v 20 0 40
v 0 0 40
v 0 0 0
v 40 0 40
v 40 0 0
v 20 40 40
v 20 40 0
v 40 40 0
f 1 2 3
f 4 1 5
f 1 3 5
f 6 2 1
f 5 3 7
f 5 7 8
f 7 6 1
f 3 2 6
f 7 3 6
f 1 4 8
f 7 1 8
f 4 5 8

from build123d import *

# Parameters (mm, degrees)
SKETCH1_W           = 40
SKETCH1_H           = 40
BOSS_EXTRUDE1_DEPTH = 40
CUT_EXTRUDE1_DEPTH  = 40
CUT_EXTRUDE3_DEPTH  = 20


with BuildPart() as part:
    # Sketch1 → Boss-Extrude1 (new body)
    with BuildSketch(Plane.XY):
        with Locations((20, 20)):
            Rectangle(SKETCH1_W, SKETCH1_H)
    extrude(amount=BOSS_EXTRUDE1_DEPTH)

    # Sketch2 → Cut-Extrude1 (cut)
    with BuildSketch(Plane.XY.offset(40)):
        Polygon((0, 0), (20, 40), (0, 40), align=None)
    extrude(amount=-CUT_EXTRUDE1_DEPTH, mode=Mode.SUBTRACT)

    # Sketch3 → Cut-Extrude3 (cut)
    with BuildSketch(Plane(origin=(40, 0, 0), x_dir=(0, 0, -1), z_dir=(1, 0, 0))):
        Polygon((0, 40), (-40, 40), (-20, 20), align=None)
        Polygon((-20, 20), (-40, 40), (-40, 0), align=None)
    extrude(amount=-CUT_EXTRUDE3_DEPTH, mode=Mode.SUBTRACT)


solid = part.part
